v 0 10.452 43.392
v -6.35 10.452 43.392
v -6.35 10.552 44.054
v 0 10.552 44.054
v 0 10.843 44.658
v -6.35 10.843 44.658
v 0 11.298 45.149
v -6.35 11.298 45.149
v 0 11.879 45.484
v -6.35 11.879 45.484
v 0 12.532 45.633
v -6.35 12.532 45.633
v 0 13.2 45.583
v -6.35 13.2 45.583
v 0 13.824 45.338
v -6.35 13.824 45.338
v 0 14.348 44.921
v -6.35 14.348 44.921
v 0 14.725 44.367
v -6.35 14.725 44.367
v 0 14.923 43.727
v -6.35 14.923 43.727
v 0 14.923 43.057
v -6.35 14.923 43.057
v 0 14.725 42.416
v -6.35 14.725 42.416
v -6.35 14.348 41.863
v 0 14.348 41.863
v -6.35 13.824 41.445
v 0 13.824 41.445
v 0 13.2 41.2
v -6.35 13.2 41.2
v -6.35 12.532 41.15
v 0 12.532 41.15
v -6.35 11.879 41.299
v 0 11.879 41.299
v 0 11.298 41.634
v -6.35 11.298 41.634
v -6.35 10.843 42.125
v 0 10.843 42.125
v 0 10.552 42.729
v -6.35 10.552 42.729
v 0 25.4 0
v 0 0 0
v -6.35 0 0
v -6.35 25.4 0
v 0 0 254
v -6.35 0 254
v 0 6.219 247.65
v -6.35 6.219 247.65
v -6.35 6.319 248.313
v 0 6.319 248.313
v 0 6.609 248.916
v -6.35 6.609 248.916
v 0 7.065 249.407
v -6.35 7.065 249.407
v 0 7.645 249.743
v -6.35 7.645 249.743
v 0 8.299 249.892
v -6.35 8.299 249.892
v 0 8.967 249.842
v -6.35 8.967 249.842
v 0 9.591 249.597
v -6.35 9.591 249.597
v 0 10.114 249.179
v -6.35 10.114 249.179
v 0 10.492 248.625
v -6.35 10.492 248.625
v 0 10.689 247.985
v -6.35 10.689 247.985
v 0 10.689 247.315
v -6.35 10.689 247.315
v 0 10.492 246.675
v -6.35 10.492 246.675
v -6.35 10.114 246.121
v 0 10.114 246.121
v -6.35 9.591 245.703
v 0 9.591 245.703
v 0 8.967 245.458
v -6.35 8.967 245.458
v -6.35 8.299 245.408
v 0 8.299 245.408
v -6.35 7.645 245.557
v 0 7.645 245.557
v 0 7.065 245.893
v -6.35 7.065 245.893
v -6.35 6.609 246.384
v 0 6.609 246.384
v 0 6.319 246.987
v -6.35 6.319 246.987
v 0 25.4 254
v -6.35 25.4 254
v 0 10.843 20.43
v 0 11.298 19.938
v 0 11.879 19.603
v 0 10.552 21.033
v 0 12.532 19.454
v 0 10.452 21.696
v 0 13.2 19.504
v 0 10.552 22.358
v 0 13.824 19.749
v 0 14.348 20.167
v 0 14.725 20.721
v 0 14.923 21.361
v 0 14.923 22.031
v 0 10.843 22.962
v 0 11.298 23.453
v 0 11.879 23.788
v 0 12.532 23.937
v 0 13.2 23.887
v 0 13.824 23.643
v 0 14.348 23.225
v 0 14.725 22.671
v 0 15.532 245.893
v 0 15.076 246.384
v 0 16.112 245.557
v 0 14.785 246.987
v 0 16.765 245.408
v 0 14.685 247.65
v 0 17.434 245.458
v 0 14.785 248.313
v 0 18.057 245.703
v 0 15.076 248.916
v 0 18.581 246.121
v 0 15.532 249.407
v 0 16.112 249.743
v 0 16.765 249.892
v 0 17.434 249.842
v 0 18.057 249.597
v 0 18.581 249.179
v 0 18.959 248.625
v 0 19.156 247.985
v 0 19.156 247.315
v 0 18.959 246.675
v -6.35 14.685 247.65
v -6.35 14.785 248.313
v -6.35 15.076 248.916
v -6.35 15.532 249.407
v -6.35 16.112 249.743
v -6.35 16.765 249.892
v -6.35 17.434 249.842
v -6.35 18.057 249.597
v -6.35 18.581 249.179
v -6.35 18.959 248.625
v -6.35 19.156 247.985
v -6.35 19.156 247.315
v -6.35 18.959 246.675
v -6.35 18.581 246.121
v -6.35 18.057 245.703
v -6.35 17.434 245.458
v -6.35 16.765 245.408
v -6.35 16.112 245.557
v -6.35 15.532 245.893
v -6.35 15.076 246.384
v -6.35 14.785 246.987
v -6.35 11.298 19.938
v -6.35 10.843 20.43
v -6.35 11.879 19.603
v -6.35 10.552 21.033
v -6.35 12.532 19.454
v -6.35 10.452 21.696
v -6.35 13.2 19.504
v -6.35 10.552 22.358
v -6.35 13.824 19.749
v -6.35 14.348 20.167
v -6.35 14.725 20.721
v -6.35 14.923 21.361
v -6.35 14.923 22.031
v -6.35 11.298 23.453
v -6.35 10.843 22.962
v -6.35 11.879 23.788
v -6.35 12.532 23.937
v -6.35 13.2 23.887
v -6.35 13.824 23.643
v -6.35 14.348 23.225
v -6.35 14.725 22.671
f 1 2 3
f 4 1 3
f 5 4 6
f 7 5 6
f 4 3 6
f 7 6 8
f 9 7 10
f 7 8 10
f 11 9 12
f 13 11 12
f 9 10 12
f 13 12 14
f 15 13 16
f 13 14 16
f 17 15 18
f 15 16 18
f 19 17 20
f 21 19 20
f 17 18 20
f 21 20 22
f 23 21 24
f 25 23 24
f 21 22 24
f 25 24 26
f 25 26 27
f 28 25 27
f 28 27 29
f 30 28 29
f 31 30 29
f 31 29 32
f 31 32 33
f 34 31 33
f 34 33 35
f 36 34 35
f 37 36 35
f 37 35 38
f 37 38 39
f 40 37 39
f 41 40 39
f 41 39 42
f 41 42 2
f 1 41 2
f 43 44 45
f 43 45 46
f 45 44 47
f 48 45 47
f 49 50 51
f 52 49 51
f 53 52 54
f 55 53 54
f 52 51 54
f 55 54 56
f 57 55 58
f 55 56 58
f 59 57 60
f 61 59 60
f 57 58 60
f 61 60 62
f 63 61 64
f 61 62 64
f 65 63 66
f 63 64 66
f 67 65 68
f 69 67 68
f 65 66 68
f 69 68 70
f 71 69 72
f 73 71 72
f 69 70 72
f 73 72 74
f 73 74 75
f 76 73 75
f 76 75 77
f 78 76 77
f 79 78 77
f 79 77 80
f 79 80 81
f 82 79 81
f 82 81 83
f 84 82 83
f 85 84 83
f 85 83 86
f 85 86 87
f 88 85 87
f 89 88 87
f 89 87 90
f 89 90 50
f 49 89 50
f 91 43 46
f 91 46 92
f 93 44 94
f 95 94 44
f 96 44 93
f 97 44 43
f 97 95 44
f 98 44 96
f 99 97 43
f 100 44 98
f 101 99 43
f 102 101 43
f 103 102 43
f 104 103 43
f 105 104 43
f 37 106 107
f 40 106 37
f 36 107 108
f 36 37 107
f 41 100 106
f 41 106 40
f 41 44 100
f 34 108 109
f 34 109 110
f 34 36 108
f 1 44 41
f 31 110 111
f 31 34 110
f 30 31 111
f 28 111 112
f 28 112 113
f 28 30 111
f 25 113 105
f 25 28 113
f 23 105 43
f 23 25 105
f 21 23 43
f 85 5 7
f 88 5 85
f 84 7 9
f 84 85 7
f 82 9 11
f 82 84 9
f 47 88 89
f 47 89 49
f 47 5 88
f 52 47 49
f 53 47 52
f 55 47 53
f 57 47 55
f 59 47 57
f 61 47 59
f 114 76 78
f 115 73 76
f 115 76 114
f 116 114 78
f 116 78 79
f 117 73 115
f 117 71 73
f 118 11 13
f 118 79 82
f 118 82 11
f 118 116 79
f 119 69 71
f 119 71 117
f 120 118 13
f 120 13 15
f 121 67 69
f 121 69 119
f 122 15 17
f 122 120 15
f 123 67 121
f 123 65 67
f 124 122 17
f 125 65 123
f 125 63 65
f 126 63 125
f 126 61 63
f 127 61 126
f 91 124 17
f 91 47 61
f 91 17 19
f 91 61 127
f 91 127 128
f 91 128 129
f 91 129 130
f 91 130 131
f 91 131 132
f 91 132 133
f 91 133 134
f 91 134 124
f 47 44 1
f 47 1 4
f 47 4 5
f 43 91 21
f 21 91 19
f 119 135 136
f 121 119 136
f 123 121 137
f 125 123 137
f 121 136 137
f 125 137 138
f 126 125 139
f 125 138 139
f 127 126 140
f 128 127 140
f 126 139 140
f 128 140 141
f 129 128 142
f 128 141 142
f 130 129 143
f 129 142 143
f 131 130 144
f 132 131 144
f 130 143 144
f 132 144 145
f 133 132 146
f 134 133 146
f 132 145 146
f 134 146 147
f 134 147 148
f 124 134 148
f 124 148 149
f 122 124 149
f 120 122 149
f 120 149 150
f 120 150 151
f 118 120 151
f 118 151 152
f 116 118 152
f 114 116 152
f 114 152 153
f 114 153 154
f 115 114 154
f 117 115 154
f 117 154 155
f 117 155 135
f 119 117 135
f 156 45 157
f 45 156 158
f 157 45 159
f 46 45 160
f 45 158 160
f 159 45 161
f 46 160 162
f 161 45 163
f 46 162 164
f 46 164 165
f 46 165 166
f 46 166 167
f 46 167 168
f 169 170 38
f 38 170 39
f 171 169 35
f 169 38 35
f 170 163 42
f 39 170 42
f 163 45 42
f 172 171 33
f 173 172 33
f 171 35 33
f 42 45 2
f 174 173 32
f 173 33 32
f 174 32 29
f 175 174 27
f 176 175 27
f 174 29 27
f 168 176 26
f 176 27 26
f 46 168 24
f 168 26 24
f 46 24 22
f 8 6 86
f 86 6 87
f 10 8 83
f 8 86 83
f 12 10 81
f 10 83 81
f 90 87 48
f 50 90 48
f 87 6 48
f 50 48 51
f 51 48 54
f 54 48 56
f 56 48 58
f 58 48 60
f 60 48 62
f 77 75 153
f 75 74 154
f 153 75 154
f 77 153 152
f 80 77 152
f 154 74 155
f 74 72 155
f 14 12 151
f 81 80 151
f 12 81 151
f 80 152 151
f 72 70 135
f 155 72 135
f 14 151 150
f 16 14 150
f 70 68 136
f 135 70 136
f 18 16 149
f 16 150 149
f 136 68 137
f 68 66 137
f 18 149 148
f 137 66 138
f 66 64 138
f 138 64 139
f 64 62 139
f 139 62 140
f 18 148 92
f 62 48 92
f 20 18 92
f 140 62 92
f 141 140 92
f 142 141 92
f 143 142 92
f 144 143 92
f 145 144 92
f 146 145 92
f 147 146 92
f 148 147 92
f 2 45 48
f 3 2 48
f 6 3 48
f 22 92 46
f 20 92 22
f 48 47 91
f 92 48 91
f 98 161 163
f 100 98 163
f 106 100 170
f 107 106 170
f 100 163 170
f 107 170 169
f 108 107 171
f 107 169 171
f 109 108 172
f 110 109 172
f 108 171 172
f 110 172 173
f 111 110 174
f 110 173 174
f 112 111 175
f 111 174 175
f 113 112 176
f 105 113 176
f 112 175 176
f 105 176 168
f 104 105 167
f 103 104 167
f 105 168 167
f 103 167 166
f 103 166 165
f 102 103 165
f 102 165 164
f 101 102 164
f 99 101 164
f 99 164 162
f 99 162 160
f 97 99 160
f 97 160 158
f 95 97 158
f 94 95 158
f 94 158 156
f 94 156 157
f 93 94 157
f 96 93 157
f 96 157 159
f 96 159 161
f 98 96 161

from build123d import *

# Parameters (mm, degrees)
F0_W     = 25.4
F0_H     = 254
F1_DEPTH = 6.35
F3_D     = 4.4958
F5_D     = 4.4958


with BuildPart() as f1:
    # F0 (on Right) → F1 (new body)
    with BuildSketch(Plane.YZ):
        with Locations((12.7, 127)):
            Rectangle(F0_W, F0_H)
    extrude(amount=-F1_DEPTH)

    # F3 (through all)
    with Locations(Plane.YZ):
        with Locations((8.46666582, 247.65), (16.93333418, 247.65)):
            Hole(F3_D / 2)

    # F5 (through all)
    with Locations(Plane.YZ):
        with Locations((12.7, 43.391666328), (12.7, 21.695833164)):
            Hole(F5_D / 2)


solid = f1.part
